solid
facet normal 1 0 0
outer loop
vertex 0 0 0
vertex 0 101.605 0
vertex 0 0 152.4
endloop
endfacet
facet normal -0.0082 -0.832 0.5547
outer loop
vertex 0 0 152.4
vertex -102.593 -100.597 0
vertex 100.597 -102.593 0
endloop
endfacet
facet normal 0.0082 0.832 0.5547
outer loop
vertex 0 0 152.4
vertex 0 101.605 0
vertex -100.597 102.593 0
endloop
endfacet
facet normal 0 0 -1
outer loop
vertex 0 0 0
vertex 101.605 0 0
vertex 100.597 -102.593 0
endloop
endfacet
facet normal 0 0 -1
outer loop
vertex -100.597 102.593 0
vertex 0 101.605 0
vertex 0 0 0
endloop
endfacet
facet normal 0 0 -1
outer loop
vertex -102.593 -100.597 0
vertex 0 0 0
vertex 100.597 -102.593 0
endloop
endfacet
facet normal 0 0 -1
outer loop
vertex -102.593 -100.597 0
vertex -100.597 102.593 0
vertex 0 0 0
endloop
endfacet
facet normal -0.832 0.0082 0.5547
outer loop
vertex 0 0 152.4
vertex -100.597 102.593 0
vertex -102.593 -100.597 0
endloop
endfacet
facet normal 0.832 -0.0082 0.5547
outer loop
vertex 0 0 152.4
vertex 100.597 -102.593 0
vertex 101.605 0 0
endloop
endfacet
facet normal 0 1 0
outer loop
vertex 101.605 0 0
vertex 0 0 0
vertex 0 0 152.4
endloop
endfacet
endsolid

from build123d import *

# Parameters (mm, degrees)
F4_W     = 4.316755
F4_H     = 4.316762
F5_DEPTH = 203.2


with BuildPart() as f3:
    # F0 (on Top) → F3 section 0
    with BuildSketch(Plane.XY, mode=Mode.PRIVATE) as f3_s0:
        Polygon((102.593086, 100.59711), (-100.59711, 102.593086), (-102.593086, -100.59711), (100.59711, -102.593086), align=None)
    loft([f3_s0.sketch, Vertex(0, 0, 152.4)])

    # F4 (on offset) → F5 (cut)
    with BuildSketch(Plane.XY.offset(152.4)):
        Polygon((0, 111.647069), (0, 0), (118.514635, 0), (118.514635, 107.330307), (114.19788, 107.330307), (114.19788, 111.647069), align=None)
        with Locations((116.356257, 109.488688)):
            Rectangle(F4_W, F4_H)
    extrude(amount=-F5_DEPTH, mode=Mode.SUBTRACT)


solid = f3.part
